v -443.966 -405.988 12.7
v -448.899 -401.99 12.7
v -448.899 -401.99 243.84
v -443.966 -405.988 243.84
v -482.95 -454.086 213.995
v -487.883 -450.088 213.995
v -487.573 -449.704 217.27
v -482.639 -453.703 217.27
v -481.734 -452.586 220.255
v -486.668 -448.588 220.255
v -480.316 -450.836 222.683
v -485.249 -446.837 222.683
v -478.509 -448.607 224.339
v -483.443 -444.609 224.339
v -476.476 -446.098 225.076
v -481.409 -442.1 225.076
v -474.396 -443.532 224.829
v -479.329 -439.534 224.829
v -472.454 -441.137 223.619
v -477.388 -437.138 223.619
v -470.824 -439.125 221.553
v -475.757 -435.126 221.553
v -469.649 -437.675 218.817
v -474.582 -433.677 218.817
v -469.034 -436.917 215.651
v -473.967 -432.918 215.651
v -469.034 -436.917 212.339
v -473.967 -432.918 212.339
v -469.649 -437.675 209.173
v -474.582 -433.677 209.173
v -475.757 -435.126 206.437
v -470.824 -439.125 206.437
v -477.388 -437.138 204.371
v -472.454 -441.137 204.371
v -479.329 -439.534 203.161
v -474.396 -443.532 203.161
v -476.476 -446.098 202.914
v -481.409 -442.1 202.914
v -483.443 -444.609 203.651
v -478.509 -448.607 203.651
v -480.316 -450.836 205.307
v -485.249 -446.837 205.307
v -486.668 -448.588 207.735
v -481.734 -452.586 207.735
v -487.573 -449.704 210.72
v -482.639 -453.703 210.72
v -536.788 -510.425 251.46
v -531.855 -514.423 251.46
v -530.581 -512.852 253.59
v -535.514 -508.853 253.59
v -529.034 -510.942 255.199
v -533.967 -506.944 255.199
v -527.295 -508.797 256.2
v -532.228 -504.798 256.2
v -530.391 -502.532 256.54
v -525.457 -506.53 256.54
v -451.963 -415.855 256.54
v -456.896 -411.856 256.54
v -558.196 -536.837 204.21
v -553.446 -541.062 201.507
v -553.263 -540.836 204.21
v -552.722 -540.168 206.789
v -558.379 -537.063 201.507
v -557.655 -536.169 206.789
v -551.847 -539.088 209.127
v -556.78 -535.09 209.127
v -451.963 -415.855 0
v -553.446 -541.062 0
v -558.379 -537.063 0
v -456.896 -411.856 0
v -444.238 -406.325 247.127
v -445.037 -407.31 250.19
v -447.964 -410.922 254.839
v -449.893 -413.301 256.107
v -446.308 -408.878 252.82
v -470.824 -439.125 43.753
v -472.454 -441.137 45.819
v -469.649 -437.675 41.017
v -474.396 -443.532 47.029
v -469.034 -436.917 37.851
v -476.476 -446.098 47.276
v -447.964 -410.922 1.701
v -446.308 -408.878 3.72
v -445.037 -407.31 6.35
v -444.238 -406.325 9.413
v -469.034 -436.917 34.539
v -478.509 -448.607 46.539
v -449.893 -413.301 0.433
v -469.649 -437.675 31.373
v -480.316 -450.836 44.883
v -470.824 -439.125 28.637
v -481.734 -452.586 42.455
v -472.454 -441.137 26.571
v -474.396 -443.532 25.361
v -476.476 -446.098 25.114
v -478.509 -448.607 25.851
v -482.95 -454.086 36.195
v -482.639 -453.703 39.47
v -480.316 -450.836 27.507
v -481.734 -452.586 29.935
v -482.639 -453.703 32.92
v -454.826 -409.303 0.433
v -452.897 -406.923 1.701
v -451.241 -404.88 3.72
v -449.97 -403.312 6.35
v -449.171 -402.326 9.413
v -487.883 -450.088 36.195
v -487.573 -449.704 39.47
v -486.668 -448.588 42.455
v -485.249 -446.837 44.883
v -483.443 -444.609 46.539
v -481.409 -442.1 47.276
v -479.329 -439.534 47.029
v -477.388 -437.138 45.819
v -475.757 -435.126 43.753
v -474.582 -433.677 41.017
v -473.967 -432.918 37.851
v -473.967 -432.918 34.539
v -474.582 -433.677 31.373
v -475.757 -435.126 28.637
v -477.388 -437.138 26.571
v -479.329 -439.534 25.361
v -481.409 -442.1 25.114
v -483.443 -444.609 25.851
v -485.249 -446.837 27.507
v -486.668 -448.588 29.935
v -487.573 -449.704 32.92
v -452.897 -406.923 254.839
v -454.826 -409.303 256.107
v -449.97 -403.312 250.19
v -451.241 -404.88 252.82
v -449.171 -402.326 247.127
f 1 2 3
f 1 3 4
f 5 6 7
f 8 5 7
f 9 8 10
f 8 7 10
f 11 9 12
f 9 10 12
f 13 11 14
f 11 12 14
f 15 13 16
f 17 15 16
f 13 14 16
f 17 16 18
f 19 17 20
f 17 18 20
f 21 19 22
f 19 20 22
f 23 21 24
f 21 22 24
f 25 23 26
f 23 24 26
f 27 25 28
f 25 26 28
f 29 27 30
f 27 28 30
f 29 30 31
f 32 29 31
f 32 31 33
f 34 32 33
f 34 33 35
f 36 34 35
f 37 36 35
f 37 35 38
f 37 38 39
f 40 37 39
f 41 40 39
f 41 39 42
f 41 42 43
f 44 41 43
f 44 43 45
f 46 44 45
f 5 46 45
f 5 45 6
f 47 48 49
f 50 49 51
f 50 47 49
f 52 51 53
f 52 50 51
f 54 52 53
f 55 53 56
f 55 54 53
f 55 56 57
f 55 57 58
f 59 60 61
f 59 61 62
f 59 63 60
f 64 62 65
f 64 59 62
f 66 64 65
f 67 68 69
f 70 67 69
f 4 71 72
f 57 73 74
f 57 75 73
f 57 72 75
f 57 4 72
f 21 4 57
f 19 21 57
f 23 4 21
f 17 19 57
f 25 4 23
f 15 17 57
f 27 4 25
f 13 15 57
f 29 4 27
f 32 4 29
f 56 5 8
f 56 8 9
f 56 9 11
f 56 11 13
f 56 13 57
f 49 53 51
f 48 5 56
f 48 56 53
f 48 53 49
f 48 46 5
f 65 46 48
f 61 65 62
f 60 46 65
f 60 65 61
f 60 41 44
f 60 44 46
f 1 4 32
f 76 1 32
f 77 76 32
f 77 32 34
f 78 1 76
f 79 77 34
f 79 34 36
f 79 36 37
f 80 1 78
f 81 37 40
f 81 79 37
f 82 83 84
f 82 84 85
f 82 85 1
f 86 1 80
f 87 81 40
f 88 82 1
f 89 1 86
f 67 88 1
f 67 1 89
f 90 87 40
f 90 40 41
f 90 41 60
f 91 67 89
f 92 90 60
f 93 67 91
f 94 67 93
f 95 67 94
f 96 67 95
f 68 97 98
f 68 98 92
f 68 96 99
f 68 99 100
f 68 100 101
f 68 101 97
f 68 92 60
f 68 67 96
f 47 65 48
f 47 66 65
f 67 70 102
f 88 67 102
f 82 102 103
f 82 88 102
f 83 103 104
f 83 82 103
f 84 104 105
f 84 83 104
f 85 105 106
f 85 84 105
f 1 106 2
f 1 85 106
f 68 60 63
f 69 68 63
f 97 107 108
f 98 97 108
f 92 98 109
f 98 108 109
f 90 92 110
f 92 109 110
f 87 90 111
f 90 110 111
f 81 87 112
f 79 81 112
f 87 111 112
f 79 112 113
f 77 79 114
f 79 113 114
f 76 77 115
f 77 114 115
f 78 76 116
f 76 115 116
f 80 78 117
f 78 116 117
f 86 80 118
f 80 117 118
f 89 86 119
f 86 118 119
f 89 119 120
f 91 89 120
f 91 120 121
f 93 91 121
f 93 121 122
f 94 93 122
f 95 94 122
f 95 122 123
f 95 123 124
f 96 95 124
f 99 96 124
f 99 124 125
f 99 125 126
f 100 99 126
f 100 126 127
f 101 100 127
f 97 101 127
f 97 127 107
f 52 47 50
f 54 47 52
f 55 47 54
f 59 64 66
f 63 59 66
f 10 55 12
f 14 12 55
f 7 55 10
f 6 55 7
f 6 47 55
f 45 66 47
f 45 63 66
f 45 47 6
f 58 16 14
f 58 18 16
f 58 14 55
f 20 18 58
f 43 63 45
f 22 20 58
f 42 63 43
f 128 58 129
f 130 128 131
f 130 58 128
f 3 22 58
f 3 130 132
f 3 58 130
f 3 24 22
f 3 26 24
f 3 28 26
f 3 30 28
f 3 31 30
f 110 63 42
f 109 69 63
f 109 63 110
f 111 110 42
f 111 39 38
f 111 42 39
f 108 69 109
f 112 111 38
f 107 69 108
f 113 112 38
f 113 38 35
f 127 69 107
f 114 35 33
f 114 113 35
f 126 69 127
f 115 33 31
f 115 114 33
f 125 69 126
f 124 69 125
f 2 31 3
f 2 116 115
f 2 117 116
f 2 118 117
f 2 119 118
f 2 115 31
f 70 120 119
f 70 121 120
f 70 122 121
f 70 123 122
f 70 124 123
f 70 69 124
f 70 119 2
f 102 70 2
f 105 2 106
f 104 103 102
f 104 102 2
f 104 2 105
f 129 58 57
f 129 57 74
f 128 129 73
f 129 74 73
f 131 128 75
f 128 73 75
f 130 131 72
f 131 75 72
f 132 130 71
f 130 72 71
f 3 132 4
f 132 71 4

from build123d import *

# Parameters (mm, degrees)
BOSS_EXTRUDE1_DEPTH     = 256.54
CUT_EXTRUDE1_REACH      = 815.442
SKETCH2_R               = 11.1125
CUT_EXTRUDE2_DEPTH      = 814.446927228
CUT_EXTRUDE2_DEPTH_BACK = 814.446927228
FILLET1_R               = 12.7


with BuildPart() as part:
    # Sketch1 → Boss-Extrude1 (new body)
    with BuildSketch(Plane.XY):
        Polygon((-443.965929871, -405.988484906), (-553.446258124, -541.061617166), (-558.379343621, -537.063221553), (-448.899015368, -401.990089292), align=None)
    extrude(amount=BOSS_EXTRUDE1_DEPTH)

    # Sketch2 → Cut-Extrude1 (cut, up to next)
    with BuildSketch(Plane(origin=(-74.278193829, 60.204430788, 0), x_dir=(0, 0, 1), z_dir=(-0.7768638577795597, 0.6296686005160651, 0)), mode=Mode.PRIVATE) as cut_extrude1_sk1:
        with Locations(Location((213.995, -645.749186336, 0), (0, 0, 270))):
            Circle(SKETCH2_R)
    cut_extrude1_tool1 = extrude(cut_extrude1_sk1.sketch, amount=-CUT_EXTRUDE1_REACH, mode=Mode.PRIVATE) & part.part
    # Sketch2 → Cut-Extrude1 (cut, up to next)
    with BuildSketch(Plane(origin=(-74.278193829, 60.204430788, 0), x_dir=(0, 0, 1), z_dir=(-0.7768638577795597, 0.6296686005160651, 0)), mode=Mode.PRIVATE) as cut_extrude1_sk2:
        with Locations(Location((36.195, -645.749186336, 0), (0, 0, 270))):
            Circle(SKETCH2_R)
    cut_extrude1_tool2 = extrude(cut_extrude1_sk2.sketch, amount=-CUT_EXTRUDE1_REACH, mode=Mode.PRIVATE) & part.part
    add(cut_extrude1_tool1.solids().sort_by_distance((-480.88618, -441.454773, 213.995))[0], mode=Mode.SUBTRACT)
    add(cut_extrude1_tool2.solids().sort_by_distance((-480.88618, -441.454773, 36.195))[0], mode=Mode.SUBTRACT)

    # Sketch3 → Cut-Extrude2 (cut, two sides: drawn at the far end of the back side and taken through both)
    with BuildSketch(Plane(origin=(-69.345108332, 56.206035175, 0), x_dir=(0, 0, -1), z_dir=(0.7768638577795598, -0.6296686005160651, 0)).offset(-CUT_EXTRUDE2_DEPTH_BACK)):
        Polygon((269.008566256, -1124.880370714), (-205.74, -768.818946022), (-256.54, -730.718946022), (-731.288566256, -374.65752133), (-1443.411415639, -1324.154653842), (-443.114283128, -2074.377503225), align=None)
    extrude(amount=CUT_EXTRUDE2_DEPTH + CUT_EXTRUDE2_DEPTH_BACK, mode=Mode.SUBTRACT)

    # Fillet1
    fillet1_edges = [part.edges().sort_by_distance(p)[0] for p in [
        (-531.922427193, -509.463906378, 256.54),
        (-446.432472619, -403.989287099, 256.54),
        (-555.912800873, -539.062419359, 205.74),
        (-446.432472619, -403.989287099, 0),
    ]]
    fillet(fillet1_edges, radius=FILLET1_R)


solid = part.part
